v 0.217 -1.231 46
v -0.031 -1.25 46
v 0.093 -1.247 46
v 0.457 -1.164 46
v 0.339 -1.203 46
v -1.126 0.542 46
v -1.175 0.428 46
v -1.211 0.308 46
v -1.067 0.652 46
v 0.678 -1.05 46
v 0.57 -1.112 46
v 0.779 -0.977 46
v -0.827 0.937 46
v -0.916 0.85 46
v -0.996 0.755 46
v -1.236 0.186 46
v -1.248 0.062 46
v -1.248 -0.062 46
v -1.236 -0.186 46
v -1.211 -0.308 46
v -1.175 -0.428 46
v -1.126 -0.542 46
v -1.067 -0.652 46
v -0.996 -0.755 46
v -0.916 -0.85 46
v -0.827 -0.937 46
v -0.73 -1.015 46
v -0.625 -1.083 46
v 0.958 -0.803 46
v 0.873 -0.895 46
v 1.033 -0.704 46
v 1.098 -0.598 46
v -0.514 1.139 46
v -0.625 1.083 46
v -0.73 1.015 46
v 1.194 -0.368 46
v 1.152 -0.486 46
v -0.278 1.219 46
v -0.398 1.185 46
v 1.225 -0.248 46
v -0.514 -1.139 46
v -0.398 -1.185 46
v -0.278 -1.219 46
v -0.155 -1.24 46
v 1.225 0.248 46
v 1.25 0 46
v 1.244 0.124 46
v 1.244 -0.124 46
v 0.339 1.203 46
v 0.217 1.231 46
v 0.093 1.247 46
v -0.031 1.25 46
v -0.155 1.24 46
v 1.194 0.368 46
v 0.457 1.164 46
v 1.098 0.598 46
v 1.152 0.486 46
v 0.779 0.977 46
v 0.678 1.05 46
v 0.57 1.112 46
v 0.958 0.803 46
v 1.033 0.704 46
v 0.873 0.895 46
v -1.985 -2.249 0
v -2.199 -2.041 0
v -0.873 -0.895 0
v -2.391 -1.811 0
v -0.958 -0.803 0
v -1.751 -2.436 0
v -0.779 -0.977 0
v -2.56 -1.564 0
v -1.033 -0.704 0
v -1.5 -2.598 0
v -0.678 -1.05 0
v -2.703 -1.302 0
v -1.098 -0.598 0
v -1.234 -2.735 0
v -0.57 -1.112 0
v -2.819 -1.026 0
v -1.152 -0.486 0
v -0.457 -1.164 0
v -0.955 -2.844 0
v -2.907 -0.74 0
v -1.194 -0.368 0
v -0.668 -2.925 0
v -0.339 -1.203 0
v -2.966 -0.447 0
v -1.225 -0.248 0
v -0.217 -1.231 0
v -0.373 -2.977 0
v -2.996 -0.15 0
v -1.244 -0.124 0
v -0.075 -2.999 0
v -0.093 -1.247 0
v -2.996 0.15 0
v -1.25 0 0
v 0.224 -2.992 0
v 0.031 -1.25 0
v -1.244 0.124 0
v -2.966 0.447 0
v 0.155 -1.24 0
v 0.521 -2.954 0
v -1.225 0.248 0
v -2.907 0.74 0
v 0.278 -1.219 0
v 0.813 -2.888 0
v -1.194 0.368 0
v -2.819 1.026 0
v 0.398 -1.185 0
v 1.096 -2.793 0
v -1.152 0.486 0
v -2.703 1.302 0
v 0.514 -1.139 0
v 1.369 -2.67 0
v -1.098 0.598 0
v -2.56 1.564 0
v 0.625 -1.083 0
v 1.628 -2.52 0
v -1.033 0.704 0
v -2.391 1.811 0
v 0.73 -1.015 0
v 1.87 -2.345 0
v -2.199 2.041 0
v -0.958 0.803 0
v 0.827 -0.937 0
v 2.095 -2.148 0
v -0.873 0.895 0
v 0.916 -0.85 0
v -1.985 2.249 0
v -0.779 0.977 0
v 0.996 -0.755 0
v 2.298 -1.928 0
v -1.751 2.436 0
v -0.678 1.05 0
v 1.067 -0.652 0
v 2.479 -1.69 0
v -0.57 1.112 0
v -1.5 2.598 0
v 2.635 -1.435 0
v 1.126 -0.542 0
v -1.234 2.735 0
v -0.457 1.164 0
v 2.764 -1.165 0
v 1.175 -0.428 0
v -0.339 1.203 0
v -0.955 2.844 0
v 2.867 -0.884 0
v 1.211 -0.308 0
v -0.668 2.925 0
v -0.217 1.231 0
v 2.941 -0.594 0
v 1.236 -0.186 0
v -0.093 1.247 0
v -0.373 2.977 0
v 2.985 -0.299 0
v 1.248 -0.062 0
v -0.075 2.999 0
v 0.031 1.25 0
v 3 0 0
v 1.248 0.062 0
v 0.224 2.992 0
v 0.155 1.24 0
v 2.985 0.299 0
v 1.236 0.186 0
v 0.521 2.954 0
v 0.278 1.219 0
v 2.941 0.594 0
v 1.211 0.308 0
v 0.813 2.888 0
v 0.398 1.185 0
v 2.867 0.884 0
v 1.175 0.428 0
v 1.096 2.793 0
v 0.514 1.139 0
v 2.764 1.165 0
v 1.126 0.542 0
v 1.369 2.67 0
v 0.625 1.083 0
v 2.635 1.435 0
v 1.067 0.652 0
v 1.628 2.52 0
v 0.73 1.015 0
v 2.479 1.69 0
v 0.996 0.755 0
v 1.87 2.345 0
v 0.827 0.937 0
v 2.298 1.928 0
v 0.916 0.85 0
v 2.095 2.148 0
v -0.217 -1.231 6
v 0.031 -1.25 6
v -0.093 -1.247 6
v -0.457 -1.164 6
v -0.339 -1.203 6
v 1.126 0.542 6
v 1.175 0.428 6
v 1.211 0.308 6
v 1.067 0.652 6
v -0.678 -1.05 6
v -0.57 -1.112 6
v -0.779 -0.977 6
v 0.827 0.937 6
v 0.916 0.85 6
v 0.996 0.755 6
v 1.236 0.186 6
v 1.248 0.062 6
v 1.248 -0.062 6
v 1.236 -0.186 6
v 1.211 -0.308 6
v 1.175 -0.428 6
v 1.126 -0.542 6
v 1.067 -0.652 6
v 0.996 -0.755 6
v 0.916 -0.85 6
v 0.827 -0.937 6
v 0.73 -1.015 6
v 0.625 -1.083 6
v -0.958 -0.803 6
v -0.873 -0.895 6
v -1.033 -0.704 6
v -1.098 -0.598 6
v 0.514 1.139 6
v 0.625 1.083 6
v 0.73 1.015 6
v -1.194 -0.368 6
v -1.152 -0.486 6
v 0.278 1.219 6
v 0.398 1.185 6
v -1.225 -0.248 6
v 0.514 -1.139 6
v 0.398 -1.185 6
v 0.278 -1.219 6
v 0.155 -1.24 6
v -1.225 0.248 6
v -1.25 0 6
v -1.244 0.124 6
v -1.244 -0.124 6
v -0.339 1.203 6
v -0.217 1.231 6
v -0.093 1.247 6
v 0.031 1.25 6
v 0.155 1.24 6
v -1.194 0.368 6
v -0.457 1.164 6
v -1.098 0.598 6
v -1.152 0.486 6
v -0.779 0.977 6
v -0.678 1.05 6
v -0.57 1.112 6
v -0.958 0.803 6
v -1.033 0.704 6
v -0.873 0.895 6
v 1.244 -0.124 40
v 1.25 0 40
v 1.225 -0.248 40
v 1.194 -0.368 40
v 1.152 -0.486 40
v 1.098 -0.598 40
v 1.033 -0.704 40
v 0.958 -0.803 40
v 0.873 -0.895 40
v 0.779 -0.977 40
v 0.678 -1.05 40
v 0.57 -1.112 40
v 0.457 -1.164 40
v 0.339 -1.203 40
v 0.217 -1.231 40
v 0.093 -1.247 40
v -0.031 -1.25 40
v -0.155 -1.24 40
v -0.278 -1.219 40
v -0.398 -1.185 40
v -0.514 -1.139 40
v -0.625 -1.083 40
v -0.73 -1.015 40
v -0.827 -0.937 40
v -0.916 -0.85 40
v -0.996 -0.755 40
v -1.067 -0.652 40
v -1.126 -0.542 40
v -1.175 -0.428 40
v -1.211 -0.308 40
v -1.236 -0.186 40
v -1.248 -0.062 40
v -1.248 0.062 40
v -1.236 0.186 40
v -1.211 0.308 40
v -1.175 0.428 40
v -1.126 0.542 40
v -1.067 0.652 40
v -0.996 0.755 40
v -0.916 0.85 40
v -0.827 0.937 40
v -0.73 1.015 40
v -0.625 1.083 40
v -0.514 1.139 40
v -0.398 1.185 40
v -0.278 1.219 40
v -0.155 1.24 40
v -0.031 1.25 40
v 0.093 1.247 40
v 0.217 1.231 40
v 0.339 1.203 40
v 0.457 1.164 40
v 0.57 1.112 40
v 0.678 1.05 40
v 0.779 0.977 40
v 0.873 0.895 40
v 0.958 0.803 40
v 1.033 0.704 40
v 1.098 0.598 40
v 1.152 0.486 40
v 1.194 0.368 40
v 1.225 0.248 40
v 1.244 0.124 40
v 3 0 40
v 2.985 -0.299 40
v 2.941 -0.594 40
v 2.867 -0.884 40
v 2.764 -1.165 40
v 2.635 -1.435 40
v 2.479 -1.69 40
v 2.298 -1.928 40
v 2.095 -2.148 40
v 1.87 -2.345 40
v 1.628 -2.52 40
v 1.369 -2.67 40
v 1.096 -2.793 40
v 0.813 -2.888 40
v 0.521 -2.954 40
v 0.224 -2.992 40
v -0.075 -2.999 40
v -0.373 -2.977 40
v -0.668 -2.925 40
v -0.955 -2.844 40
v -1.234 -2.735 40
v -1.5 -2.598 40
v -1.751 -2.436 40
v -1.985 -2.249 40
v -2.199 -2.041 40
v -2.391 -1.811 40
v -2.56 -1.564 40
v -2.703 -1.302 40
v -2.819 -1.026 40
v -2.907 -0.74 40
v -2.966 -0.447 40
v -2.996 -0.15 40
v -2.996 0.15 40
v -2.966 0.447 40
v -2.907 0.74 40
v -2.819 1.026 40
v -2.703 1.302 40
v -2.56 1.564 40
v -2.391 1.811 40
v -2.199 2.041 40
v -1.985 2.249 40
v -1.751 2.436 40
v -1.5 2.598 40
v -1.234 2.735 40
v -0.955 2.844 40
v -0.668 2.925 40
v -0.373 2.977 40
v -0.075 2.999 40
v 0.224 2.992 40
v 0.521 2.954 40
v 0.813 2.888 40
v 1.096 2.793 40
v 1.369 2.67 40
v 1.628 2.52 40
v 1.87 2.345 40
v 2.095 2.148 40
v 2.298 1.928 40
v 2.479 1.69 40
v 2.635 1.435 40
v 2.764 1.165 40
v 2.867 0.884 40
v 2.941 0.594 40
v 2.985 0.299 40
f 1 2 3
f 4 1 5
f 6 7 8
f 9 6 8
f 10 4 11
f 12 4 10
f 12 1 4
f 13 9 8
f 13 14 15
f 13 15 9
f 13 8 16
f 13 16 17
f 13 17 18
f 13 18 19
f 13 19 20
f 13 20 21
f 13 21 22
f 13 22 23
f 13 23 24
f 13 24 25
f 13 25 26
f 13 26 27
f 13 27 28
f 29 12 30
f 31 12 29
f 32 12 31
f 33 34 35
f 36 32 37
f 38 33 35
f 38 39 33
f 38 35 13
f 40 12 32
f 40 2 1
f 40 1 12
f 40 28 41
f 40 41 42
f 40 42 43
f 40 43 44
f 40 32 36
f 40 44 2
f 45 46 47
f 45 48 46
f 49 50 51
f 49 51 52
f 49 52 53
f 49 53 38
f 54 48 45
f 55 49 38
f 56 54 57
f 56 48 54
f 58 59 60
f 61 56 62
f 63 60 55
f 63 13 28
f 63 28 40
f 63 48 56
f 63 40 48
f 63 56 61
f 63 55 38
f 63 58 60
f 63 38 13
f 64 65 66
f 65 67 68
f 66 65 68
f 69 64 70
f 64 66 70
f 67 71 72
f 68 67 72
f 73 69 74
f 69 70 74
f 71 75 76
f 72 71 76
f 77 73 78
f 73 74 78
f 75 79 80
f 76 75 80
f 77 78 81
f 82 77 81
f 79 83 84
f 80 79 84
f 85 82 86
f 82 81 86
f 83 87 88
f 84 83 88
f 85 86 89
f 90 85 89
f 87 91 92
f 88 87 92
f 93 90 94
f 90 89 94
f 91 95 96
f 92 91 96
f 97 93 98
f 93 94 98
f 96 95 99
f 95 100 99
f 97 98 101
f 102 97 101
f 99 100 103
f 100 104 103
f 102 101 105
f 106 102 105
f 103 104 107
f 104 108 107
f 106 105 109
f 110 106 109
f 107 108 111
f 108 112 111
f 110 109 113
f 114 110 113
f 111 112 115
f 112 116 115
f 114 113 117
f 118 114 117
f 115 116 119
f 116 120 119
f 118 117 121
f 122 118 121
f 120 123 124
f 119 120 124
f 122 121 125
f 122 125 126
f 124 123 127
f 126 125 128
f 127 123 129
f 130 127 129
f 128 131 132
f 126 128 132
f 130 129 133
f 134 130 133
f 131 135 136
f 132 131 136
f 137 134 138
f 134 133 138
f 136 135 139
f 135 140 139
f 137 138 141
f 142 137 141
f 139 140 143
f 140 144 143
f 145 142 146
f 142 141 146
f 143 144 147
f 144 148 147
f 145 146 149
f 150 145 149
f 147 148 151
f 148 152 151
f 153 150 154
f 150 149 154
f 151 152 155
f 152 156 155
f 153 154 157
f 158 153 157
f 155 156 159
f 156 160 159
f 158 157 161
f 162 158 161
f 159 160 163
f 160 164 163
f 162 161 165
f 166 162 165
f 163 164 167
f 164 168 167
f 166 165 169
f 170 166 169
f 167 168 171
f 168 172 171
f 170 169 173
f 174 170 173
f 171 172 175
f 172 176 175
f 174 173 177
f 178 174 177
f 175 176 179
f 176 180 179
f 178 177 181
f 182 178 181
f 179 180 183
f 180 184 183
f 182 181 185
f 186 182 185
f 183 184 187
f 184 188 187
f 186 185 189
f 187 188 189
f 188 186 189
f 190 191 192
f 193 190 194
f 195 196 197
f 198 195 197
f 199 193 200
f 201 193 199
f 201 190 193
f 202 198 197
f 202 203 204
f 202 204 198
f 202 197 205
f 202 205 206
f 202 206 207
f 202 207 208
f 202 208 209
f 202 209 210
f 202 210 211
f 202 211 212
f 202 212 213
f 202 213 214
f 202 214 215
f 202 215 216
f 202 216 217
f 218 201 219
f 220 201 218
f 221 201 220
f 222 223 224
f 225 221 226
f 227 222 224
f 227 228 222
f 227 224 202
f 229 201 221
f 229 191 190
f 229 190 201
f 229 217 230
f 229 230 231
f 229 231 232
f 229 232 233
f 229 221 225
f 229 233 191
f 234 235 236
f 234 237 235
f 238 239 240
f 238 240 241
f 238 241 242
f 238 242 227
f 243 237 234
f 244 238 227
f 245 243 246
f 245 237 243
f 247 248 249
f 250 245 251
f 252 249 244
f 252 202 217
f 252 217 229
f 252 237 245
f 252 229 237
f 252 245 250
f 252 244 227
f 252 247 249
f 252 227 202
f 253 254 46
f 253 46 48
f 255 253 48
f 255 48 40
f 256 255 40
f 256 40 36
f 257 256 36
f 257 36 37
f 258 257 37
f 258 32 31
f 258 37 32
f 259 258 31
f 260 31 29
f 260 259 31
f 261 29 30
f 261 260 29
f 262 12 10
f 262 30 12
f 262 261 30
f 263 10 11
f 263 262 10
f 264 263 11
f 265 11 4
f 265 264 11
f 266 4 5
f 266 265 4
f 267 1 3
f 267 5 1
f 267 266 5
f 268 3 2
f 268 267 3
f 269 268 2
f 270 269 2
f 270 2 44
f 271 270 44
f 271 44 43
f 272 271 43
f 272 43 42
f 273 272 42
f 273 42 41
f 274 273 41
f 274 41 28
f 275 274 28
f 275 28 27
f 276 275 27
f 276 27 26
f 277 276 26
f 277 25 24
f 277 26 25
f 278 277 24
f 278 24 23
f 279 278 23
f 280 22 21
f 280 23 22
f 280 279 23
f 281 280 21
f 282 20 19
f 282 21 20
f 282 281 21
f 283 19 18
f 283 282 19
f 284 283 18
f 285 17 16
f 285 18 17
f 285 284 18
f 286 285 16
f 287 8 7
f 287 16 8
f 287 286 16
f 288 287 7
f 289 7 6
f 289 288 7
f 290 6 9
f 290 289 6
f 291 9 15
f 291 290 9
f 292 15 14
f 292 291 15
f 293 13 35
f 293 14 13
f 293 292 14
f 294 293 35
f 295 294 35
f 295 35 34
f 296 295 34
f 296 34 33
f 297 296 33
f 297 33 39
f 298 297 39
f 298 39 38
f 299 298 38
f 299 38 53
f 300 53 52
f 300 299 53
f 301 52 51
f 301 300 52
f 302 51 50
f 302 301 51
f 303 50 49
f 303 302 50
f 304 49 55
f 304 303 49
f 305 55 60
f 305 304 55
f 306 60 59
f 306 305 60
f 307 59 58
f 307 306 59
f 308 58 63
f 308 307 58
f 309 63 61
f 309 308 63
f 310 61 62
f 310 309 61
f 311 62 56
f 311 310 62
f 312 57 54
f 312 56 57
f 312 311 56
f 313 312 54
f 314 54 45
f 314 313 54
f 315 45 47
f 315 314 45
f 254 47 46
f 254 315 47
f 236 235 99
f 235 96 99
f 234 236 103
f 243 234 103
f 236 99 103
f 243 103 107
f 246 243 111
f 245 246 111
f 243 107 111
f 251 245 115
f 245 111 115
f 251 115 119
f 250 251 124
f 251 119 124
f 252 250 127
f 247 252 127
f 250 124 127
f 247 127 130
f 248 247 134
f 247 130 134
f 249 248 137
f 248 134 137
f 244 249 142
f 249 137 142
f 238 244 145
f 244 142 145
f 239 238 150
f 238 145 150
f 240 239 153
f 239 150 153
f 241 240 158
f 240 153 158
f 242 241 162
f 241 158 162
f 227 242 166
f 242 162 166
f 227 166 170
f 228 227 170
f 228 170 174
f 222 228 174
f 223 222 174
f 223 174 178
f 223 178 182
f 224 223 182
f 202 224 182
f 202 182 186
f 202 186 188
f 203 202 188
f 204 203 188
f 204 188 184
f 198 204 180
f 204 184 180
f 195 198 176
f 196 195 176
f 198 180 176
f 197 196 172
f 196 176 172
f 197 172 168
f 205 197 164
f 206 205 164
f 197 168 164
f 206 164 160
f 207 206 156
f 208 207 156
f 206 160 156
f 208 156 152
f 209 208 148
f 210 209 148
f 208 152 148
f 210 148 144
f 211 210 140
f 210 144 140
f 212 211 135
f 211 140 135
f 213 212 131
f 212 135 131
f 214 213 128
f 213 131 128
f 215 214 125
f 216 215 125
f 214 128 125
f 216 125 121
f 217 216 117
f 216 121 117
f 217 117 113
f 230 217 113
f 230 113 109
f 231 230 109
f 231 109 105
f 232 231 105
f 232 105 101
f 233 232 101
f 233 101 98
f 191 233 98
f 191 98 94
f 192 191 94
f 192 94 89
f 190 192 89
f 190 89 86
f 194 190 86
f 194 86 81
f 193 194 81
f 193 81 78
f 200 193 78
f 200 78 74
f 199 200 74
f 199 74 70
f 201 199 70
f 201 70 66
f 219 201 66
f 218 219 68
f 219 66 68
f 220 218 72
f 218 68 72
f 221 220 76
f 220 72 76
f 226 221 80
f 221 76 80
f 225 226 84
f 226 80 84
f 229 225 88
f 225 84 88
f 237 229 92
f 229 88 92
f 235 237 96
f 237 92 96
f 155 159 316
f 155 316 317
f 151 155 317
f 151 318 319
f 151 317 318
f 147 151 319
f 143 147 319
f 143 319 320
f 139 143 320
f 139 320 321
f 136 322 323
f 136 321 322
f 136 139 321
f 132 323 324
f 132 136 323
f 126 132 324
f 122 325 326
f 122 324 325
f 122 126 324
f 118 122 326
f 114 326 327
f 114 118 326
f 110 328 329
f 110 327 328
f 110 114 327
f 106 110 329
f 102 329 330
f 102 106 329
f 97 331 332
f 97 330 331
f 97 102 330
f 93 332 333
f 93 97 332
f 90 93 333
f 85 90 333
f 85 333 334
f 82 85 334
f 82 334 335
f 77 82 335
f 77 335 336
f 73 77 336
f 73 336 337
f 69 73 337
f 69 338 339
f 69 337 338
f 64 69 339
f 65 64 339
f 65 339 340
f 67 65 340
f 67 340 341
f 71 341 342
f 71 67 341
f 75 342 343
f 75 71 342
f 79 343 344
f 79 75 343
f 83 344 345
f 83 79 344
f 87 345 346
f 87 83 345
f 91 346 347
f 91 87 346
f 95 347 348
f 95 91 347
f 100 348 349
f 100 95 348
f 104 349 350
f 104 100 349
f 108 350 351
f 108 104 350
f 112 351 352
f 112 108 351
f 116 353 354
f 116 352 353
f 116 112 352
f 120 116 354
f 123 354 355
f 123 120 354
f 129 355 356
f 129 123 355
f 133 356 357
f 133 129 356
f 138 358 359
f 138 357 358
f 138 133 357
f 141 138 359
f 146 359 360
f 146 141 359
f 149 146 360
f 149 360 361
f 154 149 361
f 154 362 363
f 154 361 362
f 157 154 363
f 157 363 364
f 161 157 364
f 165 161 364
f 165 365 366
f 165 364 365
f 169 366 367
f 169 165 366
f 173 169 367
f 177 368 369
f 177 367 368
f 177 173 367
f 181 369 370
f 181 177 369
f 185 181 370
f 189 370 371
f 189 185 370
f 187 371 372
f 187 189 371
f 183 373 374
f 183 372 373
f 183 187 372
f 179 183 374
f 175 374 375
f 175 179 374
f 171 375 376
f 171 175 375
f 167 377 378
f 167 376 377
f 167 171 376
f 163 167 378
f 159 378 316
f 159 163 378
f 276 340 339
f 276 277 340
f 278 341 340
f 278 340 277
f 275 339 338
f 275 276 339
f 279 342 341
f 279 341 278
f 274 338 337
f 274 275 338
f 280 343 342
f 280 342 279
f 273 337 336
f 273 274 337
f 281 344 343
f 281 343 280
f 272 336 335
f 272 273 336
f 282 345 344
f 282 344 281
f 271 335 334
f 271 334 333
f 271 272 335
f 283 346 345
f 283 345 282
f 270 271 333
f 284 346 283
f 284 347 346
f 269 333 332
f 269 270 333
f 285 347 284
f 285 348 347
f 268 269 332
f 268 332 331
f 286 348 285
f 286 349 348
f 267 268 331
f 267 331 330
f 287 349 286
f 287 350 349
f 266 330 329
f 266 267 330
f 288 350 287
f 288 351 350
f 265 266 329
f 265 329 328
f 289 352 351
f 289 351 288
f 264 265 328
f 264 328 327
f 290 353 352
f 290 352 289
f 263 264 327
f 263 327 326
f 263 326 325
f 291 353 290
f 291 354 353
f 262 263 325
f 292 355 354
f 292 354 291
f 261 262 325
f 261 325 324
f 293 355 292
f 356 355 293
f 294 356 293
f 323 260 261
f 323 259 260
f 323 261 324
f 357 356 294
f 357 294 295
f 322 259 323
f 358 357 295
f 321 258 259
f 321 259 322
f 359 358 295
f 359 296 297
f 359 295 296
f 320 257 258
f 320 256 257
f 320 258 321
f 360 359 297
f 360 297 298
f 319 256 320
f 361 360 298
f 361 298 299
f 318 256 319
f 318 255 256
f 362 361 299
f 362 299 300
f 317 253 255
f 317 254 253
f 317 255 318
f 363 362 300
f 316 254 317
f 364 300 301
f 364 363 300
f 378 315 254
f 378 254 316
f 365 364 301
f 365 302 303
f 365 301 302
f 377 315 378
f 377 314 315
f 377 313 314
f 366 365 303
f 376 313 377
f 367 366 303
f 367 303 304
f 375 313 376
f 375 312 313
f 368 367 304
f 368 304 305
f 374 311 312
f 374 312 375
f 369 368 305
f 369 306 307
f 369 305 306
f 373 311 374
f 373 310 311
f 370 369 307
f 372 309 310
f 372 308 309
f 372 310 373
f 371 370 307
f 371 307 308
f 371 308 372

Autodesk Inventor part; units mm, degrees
ref_plane "YZ Plane" through (0, 0, 0) normal (1, 0, 0) x (0, 1, 0)
ref_plane "XZ Plane" through (0, 0, 0) normal (0, 1, 0) x (-1, 0, 0)
ref_plane "XY Plane" through (0, 0, 0) normal (0, 0, 1) x (1, 0, 0)
sketch "スケッチ1" plane through (0, 0, 0) normal (0, 0, 1) x (1, 0, 0)
  circle A0 centre (0, 0) radius 3
  dimension "d0" = 6
extrude "押し出し1" add sketch "スケッチ1" along normal blind 45
sketch "スケッチ2" plane through (0, 0, 45) normal (0, 0, 1) x (1, 0, 0)
  circle A0 centre (0, 0) radius 3 projected
  circle A1 centre (0, 0) radius 1.25
  dimension "d3" = 2.5
extrude "押し出し2" cut sketch "スケッチ2" against normal blind 6 contours A1
sketch "スケッチ3" plane through (0, 0, 0) normal (0, 0, -1) x (-1, 0, 0)
  circle A0 centre (0, 0) radius 3 projected
  circle A1 centre (0, 0) radius 1.25
  dimension "d6" = 2.5
extrude "押し出し3" cut sketch "スケッチ3" against normal blind 6 contours A1
sketch "スケッチ4" plane through (0, 0, 45) normal (0, 0, 1) x (1, 0, 0)
  circle A0 centre (0, 0) radius 1.25 projected
  circle A1 centre (0, 0) radius 3 projected
extrude "押し出し4" cut sketch "スケッチ4" against normal blind 5
sketch "スケッチ5" plane through (0, 0, 40) normal (0, 0, 1) x (1, 0, 0)
  circle A0 centre (0, 0) radius 1.25 projected
extrude "押し出し5" cut sketch "スケッチ5" against normal blind 6
sketch "スケッチ6" plane through (0, 0, 40) normal (0, 0, 1) x (1, 0, 0)
  circle A0 centre (0, 0) radius 1.25 projected
extrude "押し出し6" add sketch "スケッチ6" along normal mid plane 12
properties part number "φ6スペーサ　L40　おねめじ" material "Aluminum-6061"
